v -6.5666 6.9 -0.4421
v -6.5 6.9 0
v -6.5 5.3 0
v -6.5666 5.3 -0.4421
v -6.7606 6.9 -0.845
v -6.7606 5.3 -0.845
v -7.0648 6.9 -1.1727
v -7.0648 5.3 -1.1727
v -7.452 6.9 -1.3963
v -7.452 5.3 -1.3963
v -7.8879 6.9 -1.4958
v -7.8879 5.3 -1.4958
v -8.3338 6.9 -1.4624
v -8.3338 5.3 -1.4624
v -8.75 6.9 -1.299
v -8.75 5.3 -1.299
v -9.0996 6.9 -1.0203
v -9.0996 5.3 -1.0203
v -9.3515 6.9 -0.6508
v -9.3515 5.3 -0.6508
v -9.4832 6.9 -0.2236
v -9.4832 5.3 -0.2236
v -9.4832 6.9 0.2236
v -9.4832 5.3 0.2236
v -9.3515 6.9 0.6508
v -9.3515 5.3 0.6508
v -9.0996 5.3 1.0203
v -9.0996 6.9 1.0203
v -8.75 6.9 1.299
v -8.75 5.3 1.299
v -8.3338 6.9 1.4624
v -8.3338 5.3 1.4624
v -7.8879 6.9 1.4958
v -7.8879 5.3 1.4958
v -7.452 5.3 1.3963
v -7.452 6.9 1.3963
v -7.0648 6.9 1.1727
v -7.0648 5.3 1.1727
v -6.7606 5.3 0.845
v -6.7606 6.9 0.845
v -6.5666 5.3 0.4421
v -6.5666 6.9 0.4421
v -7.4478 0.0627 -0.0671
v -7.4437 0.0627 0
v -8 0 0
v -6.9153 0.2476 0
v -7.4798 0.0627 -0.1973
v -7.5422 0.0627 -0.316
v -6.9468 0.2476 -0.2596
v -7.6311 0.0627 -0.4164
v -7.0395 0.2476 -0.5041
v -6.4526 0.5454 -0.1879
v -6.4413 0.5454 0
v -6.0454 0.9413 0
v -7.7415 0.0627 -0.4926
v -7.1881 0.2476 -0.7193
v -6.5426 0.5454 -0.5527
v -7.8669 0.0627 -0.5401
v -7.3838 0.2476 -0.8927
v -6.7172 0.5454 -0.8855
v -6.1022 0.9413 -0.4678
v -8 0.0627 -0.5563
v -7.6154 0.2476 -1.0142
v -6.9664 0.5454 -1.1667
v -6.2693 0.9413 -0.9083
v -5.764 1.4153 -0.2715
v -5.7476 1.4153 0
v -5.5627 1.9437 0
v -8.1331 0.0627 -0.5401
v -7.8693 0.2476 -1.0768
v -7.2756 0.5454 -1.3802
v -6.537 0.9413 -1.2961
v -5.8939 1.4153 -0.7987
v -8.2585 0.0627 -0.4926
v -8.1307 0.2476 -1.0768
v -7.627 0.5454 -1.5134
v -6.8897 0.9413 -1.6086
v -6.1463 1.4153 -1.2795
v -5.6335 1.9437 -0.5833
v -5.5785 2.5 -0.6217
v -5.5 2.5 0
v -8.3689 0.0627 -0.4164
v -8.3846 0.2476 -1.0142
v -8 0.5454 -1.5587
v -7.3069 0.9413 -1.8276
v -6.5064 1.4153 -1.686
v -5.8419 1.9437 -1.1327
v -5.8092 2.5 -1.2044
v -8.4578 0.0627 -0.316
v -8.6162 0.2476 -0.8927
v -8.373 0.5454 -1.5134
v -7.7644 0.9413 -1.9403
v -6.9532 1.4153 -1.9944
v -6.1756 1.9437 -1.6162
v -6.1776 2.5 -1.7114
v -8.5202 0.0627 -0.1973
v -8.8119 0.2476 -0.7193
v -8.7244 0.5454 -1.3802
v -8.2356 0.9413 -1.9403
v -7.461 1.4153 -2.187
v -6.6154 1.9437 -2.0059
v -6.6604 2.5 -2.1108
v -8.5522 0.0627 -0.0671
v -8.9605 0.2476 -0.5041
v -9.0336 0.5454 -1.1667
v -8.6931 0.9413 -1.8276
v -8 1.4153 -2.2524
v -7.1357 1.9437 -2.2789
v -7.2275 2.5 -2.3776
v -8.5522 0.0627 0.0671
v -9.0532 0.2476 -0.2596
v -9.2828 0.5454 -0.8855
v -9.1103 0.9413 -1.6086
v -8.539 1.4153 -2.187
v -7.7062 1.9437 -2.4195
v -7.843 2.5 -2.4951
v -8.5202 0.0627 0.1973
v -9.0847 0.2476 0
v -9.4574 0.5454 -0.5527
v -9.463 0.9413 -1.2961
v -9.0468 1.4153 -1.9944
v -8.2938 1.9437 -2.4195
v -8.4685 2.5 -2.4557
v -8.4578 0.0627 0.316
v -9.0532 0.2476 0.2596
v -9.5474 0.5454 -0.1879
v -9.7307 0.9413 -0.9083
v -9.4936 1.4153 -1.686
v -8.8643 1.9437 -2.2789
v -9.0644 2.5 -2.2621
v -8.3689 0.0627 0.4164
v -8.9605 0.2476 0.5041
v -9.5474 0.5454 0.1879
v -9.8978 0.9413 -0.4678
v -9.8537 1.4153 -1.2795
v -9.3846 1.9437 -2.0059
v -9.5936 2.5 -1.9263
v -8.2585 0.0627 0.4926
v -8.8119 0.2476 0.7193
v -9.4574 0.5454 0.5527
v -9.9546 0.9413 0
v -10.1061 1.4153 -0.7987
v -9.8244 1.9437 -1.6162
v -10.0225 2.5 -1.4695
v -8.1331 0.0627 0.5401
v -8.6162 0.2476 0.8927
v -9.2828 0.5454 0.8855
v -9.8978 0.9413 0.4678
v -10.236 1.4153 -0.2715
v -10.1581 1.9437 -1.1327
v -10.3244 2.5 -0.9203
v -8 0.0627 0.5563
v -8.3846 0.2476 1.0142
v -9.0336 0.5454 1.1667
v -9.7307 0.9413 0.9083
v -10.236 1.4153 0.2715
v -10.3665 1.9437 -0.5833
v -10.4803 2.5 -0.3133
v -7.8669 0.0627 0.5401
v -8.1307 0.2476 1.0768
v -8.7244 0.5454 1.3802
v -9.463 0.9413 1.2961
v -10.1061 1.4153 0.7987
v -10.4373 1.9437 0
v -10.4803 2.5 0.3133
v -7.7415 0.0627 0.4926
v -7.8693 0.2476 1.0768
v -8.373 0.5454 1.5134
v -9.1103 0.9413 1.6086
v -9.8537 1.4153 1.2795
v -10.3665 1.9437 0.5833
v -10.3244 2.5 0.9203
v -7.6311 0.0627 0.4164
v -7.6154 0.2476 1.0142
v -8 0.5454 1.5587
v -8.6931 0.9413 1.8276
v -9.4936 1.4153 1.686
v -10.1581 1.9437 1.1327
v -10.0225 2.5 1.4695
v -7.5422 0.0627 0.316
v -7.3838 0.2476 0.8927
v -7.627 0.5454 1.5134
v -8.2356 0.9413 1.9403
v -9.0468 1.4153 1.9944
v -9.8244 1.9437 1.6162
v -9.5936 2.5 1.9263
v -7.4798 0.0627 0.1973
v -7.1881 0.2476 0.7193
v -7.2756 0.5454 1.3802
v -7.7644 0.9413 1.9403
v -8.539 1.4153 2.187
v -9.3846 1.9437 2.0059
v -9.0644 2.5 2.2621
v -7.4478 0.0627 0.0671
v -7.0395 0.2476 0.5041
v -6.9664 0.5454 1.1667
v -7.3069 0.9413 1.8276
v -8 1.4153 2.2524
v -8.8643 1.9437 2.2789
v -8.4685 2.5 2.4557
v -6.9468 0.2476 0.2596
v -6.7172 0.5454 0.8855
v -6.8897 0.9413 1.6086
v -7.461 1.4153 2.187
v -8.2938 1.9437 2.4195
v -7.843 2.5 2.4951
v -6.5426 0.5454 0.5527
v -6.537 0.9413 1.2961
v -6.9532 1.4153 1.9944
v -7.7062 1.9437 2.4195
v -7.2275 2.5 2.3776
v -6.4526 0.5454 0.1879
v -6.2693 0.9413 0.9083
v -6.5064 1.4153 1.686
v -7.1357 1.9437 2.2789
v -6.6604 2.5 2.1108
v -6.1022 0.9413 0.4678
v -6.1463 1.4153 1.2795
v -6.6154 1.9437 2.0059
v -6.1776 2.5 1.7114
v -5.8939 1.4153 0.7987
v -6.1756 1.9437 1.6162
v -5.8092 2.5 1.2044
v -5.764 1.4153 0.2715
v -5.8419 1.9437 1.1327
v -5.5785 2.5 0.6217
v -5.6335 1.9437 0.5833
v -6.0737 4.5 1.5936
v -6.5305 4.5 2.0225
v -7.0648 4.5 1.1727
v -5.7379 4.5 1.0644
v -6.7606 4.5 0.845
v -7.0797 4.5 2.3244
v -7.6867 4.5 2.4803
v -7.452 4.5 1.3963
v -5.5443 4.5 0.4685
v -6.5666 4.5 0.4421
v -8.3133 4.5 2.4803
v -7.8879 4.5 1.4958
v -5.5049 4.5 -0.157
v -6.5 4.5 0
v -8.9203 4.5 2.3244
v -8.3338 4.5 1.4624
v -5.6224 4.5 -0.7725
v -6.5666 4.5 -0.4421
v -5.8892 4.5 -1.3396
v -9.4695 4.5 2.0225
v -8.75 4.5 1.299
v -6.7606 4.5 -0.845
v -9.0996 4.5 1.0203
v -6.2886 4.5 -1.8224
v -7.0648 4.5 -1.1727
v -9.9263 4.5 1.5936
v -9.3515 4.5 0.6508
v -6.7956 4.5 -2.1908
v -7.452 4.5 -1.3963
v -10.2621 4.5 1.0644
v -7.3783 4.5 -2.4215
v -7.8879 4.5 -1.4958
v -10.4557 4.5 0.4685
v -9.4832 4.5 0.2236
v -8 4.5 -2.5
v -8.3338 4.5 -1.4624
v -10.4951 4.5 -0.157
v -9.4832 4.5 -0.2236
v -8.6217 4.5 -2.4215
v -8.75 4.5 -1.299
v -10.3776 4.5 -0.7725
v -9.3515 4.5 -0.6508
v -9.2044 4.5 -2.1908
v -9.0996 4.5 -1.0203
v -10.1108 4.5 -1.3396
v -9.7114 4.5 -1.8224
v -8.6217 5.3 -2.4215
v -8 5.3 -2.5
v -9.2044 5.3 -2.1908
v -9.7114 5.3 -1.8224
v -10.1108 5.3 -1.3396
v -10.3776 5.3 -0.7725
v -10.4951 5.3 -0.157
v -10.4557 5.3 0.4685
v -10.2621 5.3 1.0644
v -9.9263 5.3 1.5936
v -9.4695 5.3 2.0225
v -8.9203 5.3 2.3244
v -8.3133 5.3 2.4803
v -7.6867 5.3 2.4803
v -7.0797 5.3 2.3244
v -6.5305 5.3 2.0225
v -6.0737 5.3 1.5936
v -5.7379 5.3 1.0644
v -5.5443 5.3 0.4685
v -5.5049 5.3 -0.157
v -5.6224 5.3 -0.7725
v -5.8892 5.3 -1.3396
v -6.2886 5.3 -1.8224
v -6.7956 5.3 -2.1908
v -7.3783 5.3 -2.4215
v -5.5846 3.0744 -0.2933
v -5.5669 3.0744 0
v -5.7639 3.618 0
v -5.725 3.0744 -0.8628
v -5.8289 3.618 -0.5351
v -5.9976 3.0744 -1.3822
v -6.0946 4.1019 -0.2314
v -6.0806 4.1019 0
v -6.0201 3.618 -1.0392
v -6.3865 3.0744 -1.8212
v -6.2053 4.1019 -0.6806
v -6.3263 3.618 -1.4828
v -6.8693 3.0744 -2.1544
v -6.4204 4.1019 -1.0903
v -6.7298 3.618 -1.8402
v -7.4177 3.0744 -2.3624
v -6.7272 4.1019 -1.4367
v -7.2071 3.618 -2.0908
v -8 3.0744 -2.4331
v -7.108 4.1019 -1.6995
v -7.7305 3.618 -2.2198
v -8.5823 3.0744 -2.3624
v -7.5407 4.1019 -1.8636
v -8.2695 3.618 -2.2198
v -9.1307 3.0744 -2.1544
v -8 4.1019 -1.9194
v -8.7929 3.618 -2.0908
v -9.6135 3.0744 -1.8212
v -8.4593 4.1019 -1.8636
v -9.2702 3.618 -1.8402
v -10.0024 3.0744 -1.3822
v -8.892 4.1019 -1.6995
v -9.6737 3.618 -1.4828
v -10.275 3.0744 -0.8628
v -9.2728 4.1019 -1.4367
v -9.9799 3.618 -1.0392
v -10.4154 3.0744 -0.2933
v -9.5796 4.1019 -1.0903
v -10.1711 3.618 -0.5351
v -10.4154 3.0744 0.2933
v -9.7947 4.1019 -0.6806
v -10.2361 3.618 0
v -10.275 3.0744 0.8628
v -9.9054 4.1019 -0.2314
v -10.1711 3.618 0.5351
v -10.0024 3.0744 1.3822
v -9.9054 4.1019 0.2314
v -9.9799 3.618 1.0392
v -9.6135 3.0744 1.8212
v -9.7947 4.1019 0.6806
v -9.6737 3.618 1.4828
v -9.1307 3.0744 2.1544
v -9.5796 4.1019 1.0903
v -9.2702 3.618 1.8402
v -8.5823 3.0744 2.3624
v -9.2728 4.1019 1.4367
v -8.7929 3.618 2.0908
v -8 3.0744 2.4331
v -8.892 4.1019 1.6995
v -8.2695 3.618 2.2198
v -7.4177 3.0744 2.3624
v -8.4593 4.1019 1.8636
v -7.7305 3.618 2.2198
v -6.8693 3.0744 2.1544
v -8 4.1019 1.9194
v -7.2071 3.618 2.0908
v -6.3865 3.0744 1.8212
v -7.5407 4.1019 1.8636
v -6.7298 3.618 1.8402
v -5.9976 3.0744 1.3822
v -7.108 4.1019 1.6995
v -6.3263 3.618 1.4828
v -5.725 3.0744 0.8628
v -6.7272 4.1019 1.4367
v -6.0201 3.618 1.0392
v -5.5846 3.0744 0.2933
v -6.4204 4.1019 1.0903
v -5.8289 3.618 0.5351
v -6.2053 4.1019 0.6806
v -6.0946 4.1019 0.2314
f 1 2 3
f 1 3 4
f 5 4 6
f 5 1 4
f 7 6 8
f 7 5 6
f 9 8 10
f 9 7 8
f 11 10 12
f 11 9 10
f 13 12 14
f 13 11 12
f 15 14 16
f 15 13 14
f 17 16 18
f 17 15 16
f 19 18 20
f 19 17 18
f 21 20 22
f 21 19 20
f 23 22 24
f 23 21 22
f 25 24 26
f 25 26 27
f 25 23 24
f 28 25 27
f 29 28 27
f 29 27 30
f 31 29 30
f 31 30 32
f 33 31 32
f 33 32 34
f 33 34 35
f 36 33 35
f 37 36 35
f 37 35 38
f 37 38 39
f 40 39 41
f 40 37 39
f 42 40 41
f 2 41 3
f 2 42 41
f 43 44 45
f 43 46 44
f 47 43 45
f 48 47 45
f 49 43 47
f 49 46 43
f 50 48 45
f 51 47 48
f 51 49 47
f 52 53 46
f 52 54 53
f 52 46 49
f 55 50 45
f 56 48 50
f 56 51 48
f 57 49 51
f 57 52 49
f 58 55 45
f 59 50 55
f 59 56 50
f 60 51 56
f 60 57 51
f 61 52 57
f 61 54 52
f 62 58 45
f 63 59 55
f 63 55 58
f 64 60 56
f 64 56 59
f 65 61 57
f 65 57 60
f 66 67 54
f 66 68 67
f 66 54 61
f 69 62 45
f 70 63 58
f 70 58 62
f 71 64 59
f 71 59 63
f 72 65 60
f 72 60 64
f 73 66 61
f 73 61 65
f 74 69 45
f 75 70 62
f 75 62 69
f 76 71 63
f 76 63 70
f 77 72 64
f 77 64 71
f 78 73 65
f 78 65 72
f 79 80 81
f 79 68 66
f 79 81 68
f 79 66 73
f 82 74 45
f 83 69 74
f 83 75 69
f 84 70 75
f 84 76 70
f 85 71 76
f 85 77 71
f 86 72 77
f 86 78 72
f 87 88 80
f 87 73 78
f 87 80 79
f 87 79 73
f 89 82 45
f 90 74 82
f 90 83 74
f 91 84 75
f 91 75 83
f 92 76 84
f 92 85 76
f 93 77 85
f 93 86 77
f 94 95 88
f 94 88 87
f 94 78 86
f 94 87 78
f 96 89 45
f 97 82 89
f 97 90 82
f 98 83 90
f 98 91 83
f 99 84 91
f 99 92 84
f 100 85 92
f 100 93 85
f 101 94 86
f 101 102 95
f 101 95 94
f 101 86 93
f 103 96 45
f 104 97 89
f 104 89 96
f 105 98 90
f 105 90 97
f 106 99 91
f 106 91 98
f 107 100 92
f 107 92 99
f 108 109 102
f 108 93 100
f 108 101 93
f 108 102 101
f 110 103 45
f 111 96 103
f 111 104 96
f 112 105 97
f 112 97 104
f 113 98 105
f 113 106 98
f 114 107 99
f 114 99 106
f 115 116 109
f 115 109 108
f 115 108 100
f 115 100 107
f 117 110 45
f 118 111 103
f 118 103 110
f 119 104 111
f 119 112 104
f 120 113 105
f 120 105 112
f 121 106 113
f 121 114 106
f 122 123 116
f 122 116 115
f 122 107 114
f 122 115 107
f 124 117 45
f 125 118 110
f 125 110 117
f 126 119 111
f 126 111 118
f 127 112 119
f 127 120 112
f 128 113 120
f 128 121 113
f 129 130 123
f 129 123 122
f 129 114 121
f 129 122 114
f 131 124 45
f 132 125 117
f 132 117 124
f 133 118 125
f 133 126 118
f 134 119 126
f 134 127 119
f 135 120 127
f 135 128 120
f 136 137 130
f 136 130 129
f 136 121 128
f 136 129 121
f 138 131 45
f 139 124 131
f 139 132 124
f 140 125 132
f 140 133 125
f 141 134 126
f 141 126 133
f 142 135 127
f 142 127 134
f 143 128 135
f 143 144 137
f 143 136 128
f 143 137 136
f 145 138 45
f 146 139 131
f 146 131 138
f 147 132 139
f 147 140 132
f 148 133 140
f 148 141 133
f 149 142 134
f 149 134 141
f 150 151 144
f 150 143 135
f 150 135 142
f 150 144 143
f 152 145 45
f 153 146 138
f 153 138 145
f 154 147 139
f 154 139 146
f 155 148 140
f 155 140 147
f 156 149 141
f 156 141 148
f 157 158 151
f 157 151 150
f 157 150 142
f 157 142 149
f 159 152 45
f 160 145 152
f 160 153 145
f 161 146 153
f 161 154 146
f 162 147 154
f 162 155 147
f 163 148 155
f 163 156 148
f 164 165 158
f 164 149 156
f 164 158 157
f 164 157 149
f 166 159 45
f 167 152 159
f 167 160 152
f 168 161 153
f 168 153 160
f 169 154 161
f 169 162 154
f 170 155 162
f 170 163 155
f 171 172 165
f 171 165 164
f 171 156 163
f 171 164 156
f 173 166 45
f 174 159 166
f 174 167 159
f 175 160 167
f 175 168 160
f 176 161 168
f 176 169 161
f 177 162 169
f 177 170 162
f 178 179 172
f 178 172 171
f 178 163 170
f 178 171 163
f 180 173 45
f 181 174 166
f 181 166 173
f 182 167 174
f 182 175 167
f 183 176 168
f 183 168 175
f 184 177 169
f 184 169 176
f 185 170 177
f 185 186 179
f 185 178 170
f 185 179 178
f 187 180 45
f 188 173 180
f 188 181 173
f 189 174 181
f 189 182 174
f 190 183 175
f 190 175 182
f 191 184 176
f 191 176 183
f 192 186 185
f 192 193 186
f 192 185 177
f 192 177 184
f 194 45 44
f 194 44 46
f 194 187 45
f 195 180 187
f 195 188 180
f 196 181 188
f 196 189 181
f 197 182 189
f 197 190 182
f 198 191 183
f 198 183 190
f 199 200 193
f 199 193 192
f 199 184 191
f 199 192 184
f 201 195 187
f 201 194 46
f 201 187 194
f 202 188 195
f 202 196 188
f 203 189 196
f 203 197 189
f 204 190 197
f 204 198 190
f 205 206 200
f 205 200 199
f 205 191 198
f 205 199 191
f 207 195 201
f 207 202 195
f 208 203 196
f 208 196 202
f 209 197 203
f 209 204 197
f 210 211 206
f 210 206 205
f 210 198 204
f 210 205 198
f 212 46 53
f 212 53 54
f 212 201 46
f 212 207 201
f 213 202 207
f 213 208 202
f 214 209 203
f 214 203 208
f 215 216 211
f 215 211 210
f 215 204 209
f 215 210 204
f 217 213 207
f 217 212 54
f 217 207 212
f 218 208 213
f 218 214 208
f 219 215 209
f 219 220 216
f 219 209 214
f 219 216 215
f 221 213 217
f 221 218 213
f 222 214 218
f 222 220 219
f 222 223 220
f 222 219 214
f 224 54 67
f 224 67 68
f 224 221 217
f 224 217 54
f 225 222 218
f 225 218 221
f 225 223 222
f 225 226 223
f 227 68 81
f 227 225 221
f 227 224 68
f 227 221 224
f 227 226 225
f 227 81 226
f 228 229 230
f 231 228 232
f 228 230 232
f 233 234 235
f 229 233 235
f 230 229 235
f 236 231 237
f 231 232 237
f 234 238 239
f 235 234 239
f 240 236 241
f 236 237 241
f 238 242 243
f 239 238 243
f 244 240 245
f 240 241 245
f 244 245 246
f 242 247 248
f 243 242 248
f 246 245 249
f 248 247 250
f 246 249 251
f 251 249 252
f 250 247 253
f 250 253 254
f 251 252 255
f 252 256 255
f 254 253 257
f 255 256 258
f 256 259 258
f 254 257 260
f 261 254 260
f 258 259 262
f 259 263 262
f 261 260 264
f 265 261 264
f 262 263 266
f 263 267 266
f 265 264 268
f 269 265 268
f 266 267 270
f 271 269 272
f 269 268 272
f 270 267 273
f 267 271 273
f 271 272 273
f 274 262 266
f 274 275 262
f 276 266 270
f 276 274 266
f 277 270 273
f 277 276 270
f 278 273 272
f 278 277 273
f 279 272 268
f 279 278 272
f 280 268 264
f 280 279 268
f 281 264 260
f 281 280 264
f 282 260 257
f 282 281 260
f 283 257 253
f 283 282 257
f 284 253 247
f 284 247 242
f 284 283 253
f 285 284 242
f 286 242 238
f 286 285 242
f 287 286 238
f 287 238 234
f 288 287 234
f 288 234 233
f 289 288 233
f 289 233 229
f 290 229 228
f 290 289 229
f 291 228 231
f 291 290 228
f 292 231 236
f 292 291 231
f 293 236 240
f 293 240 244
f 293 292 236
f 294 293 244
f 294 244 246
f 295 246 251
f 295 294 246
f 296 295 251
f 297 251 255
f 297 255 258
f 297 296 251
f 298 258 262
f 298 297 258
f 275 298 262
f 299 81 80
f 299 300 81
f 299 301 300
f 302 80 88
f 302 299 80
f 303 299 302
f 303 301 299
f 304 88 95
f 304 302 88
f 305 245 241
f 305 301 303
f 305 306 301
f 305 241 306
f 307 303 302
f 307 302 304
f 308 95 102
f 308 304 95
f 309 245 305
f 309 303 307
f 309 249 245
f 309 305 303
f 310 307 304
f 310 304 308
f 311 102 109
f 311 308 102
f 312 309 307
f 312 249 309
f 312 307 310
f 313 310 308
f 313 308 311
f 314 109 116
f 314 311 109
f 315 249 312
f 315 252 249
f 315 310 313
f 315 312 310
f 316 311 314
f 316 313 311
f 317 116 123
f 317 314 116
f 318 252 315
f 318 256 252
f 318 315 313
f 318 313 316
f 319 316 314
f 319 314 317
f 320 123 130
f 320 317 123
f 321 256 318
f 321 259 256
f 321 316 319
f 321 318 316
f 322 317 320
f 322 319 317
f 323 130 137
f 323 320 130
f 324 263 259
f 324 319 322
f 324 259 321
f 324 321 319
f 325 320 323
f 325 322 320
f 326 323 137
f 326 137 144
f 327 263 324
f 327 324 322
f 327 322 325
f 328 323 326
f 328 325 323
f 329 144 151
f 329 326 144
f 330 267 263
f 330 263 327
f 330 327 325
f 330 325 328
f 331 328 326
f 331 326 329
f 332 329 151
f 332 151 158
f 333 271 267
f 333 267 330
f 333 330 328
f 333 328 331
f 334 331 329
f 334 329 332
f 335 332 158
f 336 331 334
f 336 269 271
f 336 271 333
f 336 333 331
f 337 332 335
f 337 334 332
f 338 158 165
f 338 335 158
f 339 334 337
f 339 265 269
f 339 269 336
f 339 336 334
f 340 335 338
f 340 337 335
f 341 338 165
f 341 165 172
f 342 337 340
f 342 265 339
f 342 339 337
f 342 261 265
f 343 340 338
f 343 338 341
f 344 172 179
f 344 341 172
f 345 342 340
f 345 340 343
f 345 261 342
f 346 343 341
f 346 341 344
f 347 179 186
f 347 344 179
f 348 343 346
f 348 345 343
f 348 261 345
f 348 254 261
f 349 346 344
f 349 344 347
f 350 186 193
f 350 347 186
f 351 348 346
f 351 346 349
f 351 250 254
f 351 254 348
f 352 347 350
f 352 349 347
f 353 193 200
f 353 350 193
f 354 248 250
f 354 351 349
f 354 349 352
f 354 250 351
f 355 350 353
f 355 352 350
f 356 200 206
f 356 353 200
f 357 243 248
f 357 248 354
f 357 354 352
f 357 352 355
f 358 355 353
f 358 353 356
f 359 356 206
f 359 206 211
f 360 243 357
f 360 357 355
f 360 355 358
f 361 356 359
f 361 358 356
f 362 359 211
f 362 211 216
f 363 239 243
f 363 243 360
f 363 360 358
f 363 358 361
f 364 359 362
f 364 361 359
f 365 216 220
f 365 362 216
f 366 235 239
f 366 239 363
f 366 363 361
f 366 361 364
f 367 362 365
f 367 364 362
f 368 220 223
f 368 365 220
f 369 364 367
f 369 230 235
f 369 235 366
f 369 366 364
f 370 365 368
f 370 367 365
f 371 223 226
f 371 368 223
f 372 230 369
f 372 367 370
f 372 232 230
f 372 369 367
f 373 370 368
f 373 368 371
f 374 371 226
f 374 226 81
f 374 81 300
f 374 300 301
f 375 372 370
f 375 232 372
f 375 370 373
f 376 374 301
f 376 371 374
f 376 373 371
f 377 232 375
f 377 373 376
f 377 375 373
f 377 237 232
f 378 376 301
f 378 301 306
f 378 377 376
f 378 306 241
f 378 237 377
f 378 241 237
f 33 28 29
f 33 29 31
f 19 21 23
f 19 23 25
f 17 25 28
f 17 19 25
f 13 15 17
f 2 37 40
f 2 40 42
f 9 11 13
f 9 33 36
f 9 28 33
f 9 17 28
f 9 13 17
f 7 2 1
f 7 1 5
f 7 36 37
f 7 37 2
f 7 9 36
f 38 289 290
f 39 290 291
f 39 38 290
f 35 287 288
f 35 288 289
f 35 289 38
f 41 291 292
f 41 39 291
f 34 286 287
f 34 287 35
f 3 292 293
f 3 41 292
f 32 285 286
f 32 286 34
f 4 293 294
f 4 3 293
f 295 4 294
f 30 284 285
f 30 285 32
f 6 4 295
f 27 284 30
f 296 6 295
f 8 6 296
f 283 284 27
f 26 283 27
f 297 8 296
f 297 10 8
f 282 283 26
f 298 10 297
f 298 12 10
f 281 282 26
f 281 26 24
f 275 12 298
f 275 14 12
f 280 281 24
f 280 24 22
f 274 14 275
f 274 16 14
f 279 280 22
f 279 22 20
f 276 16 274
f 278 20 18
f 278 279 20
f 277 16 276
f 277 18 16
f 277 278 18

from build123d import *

# Parameters (mm, degrees)
SKETCH1_W                = 2.5
SKETCH1_H                = 0.8
SURFACE_EXTRUDE1_1_BACK  = 5
SURFACE_EXTRUDE1_1_DEPTH = 10


# Read off the part's stored shape, not the designer's step: Stock-Ball_socket_test-1
with BuildPart() as part:
    # Stock-Ball_socket_test-1 outline → Stock-Ball_socket_test-1 (revolve)
    with BuildSketch(Plane(origin=(-8, 0, 0), x_dir=(1, 0, 0), z_dir=(0, 0, 1))):
        with BuildLine():
            ThreePointArc((0, 0), (1.767766953, 0.732233047), (2.5, 2.5))
            ThreePointArc((2.5, 2.5), (2.236067977, 3.618033989), (1.5, 4.5))
            Line((1.5, 4.5), (1.5, 7.5))
            Line((1.5, 7.5), (0, 7.5))
            Line((0, 7.5), (0, 0))
        make_face()
    revolve(axis=Axis((-8, 0, 0), (0, 1, 0)))

    # Sketch1 → Revolve1 (revolve)
    with BuildSketch(Plane.XY, mode=Mode.PRIVATE) as revolve1_sk:
        with Locations((-9.25, 4.9)):
            Rectangle(SKETCH1_W, SKETCH1_H)
    revolve(revolve1_sk.sketch.rotate(Axis((-8, 0, 0), (0, 1, 0)), 270), axis=Axis((-8, 0, 0), (0, 1, 0)))

    # SurfaceCut1: cut with a surface, the side behind it stays
    # Surface-Extrude1: a surface, the sketch's curves swept straight by 10 mm
    with BuildLine(Plane.XY.offset(-SURFACE_EXTRUDE1_1_BACK), mode=Mode.PRIVATE) as surface_extrude1_1_path:
        Line((-10.166377041, 6.9), (-4.598288461, 6.9))
    surface_extrude1_1 = Shell.extrude(surface_extrude1_1_path.wire(), (0 * SURFACE_EXTRUDE1_1_DEPTH, 0 * SURFACE_EXTRUDE1_1_DEPTH, 1 * SURFACE_EXTRUDE1_1_DEPTH))
    split(bisect_by=surface_extrude1_1, keep=Keep.BOTTOM)


solid = part.part
